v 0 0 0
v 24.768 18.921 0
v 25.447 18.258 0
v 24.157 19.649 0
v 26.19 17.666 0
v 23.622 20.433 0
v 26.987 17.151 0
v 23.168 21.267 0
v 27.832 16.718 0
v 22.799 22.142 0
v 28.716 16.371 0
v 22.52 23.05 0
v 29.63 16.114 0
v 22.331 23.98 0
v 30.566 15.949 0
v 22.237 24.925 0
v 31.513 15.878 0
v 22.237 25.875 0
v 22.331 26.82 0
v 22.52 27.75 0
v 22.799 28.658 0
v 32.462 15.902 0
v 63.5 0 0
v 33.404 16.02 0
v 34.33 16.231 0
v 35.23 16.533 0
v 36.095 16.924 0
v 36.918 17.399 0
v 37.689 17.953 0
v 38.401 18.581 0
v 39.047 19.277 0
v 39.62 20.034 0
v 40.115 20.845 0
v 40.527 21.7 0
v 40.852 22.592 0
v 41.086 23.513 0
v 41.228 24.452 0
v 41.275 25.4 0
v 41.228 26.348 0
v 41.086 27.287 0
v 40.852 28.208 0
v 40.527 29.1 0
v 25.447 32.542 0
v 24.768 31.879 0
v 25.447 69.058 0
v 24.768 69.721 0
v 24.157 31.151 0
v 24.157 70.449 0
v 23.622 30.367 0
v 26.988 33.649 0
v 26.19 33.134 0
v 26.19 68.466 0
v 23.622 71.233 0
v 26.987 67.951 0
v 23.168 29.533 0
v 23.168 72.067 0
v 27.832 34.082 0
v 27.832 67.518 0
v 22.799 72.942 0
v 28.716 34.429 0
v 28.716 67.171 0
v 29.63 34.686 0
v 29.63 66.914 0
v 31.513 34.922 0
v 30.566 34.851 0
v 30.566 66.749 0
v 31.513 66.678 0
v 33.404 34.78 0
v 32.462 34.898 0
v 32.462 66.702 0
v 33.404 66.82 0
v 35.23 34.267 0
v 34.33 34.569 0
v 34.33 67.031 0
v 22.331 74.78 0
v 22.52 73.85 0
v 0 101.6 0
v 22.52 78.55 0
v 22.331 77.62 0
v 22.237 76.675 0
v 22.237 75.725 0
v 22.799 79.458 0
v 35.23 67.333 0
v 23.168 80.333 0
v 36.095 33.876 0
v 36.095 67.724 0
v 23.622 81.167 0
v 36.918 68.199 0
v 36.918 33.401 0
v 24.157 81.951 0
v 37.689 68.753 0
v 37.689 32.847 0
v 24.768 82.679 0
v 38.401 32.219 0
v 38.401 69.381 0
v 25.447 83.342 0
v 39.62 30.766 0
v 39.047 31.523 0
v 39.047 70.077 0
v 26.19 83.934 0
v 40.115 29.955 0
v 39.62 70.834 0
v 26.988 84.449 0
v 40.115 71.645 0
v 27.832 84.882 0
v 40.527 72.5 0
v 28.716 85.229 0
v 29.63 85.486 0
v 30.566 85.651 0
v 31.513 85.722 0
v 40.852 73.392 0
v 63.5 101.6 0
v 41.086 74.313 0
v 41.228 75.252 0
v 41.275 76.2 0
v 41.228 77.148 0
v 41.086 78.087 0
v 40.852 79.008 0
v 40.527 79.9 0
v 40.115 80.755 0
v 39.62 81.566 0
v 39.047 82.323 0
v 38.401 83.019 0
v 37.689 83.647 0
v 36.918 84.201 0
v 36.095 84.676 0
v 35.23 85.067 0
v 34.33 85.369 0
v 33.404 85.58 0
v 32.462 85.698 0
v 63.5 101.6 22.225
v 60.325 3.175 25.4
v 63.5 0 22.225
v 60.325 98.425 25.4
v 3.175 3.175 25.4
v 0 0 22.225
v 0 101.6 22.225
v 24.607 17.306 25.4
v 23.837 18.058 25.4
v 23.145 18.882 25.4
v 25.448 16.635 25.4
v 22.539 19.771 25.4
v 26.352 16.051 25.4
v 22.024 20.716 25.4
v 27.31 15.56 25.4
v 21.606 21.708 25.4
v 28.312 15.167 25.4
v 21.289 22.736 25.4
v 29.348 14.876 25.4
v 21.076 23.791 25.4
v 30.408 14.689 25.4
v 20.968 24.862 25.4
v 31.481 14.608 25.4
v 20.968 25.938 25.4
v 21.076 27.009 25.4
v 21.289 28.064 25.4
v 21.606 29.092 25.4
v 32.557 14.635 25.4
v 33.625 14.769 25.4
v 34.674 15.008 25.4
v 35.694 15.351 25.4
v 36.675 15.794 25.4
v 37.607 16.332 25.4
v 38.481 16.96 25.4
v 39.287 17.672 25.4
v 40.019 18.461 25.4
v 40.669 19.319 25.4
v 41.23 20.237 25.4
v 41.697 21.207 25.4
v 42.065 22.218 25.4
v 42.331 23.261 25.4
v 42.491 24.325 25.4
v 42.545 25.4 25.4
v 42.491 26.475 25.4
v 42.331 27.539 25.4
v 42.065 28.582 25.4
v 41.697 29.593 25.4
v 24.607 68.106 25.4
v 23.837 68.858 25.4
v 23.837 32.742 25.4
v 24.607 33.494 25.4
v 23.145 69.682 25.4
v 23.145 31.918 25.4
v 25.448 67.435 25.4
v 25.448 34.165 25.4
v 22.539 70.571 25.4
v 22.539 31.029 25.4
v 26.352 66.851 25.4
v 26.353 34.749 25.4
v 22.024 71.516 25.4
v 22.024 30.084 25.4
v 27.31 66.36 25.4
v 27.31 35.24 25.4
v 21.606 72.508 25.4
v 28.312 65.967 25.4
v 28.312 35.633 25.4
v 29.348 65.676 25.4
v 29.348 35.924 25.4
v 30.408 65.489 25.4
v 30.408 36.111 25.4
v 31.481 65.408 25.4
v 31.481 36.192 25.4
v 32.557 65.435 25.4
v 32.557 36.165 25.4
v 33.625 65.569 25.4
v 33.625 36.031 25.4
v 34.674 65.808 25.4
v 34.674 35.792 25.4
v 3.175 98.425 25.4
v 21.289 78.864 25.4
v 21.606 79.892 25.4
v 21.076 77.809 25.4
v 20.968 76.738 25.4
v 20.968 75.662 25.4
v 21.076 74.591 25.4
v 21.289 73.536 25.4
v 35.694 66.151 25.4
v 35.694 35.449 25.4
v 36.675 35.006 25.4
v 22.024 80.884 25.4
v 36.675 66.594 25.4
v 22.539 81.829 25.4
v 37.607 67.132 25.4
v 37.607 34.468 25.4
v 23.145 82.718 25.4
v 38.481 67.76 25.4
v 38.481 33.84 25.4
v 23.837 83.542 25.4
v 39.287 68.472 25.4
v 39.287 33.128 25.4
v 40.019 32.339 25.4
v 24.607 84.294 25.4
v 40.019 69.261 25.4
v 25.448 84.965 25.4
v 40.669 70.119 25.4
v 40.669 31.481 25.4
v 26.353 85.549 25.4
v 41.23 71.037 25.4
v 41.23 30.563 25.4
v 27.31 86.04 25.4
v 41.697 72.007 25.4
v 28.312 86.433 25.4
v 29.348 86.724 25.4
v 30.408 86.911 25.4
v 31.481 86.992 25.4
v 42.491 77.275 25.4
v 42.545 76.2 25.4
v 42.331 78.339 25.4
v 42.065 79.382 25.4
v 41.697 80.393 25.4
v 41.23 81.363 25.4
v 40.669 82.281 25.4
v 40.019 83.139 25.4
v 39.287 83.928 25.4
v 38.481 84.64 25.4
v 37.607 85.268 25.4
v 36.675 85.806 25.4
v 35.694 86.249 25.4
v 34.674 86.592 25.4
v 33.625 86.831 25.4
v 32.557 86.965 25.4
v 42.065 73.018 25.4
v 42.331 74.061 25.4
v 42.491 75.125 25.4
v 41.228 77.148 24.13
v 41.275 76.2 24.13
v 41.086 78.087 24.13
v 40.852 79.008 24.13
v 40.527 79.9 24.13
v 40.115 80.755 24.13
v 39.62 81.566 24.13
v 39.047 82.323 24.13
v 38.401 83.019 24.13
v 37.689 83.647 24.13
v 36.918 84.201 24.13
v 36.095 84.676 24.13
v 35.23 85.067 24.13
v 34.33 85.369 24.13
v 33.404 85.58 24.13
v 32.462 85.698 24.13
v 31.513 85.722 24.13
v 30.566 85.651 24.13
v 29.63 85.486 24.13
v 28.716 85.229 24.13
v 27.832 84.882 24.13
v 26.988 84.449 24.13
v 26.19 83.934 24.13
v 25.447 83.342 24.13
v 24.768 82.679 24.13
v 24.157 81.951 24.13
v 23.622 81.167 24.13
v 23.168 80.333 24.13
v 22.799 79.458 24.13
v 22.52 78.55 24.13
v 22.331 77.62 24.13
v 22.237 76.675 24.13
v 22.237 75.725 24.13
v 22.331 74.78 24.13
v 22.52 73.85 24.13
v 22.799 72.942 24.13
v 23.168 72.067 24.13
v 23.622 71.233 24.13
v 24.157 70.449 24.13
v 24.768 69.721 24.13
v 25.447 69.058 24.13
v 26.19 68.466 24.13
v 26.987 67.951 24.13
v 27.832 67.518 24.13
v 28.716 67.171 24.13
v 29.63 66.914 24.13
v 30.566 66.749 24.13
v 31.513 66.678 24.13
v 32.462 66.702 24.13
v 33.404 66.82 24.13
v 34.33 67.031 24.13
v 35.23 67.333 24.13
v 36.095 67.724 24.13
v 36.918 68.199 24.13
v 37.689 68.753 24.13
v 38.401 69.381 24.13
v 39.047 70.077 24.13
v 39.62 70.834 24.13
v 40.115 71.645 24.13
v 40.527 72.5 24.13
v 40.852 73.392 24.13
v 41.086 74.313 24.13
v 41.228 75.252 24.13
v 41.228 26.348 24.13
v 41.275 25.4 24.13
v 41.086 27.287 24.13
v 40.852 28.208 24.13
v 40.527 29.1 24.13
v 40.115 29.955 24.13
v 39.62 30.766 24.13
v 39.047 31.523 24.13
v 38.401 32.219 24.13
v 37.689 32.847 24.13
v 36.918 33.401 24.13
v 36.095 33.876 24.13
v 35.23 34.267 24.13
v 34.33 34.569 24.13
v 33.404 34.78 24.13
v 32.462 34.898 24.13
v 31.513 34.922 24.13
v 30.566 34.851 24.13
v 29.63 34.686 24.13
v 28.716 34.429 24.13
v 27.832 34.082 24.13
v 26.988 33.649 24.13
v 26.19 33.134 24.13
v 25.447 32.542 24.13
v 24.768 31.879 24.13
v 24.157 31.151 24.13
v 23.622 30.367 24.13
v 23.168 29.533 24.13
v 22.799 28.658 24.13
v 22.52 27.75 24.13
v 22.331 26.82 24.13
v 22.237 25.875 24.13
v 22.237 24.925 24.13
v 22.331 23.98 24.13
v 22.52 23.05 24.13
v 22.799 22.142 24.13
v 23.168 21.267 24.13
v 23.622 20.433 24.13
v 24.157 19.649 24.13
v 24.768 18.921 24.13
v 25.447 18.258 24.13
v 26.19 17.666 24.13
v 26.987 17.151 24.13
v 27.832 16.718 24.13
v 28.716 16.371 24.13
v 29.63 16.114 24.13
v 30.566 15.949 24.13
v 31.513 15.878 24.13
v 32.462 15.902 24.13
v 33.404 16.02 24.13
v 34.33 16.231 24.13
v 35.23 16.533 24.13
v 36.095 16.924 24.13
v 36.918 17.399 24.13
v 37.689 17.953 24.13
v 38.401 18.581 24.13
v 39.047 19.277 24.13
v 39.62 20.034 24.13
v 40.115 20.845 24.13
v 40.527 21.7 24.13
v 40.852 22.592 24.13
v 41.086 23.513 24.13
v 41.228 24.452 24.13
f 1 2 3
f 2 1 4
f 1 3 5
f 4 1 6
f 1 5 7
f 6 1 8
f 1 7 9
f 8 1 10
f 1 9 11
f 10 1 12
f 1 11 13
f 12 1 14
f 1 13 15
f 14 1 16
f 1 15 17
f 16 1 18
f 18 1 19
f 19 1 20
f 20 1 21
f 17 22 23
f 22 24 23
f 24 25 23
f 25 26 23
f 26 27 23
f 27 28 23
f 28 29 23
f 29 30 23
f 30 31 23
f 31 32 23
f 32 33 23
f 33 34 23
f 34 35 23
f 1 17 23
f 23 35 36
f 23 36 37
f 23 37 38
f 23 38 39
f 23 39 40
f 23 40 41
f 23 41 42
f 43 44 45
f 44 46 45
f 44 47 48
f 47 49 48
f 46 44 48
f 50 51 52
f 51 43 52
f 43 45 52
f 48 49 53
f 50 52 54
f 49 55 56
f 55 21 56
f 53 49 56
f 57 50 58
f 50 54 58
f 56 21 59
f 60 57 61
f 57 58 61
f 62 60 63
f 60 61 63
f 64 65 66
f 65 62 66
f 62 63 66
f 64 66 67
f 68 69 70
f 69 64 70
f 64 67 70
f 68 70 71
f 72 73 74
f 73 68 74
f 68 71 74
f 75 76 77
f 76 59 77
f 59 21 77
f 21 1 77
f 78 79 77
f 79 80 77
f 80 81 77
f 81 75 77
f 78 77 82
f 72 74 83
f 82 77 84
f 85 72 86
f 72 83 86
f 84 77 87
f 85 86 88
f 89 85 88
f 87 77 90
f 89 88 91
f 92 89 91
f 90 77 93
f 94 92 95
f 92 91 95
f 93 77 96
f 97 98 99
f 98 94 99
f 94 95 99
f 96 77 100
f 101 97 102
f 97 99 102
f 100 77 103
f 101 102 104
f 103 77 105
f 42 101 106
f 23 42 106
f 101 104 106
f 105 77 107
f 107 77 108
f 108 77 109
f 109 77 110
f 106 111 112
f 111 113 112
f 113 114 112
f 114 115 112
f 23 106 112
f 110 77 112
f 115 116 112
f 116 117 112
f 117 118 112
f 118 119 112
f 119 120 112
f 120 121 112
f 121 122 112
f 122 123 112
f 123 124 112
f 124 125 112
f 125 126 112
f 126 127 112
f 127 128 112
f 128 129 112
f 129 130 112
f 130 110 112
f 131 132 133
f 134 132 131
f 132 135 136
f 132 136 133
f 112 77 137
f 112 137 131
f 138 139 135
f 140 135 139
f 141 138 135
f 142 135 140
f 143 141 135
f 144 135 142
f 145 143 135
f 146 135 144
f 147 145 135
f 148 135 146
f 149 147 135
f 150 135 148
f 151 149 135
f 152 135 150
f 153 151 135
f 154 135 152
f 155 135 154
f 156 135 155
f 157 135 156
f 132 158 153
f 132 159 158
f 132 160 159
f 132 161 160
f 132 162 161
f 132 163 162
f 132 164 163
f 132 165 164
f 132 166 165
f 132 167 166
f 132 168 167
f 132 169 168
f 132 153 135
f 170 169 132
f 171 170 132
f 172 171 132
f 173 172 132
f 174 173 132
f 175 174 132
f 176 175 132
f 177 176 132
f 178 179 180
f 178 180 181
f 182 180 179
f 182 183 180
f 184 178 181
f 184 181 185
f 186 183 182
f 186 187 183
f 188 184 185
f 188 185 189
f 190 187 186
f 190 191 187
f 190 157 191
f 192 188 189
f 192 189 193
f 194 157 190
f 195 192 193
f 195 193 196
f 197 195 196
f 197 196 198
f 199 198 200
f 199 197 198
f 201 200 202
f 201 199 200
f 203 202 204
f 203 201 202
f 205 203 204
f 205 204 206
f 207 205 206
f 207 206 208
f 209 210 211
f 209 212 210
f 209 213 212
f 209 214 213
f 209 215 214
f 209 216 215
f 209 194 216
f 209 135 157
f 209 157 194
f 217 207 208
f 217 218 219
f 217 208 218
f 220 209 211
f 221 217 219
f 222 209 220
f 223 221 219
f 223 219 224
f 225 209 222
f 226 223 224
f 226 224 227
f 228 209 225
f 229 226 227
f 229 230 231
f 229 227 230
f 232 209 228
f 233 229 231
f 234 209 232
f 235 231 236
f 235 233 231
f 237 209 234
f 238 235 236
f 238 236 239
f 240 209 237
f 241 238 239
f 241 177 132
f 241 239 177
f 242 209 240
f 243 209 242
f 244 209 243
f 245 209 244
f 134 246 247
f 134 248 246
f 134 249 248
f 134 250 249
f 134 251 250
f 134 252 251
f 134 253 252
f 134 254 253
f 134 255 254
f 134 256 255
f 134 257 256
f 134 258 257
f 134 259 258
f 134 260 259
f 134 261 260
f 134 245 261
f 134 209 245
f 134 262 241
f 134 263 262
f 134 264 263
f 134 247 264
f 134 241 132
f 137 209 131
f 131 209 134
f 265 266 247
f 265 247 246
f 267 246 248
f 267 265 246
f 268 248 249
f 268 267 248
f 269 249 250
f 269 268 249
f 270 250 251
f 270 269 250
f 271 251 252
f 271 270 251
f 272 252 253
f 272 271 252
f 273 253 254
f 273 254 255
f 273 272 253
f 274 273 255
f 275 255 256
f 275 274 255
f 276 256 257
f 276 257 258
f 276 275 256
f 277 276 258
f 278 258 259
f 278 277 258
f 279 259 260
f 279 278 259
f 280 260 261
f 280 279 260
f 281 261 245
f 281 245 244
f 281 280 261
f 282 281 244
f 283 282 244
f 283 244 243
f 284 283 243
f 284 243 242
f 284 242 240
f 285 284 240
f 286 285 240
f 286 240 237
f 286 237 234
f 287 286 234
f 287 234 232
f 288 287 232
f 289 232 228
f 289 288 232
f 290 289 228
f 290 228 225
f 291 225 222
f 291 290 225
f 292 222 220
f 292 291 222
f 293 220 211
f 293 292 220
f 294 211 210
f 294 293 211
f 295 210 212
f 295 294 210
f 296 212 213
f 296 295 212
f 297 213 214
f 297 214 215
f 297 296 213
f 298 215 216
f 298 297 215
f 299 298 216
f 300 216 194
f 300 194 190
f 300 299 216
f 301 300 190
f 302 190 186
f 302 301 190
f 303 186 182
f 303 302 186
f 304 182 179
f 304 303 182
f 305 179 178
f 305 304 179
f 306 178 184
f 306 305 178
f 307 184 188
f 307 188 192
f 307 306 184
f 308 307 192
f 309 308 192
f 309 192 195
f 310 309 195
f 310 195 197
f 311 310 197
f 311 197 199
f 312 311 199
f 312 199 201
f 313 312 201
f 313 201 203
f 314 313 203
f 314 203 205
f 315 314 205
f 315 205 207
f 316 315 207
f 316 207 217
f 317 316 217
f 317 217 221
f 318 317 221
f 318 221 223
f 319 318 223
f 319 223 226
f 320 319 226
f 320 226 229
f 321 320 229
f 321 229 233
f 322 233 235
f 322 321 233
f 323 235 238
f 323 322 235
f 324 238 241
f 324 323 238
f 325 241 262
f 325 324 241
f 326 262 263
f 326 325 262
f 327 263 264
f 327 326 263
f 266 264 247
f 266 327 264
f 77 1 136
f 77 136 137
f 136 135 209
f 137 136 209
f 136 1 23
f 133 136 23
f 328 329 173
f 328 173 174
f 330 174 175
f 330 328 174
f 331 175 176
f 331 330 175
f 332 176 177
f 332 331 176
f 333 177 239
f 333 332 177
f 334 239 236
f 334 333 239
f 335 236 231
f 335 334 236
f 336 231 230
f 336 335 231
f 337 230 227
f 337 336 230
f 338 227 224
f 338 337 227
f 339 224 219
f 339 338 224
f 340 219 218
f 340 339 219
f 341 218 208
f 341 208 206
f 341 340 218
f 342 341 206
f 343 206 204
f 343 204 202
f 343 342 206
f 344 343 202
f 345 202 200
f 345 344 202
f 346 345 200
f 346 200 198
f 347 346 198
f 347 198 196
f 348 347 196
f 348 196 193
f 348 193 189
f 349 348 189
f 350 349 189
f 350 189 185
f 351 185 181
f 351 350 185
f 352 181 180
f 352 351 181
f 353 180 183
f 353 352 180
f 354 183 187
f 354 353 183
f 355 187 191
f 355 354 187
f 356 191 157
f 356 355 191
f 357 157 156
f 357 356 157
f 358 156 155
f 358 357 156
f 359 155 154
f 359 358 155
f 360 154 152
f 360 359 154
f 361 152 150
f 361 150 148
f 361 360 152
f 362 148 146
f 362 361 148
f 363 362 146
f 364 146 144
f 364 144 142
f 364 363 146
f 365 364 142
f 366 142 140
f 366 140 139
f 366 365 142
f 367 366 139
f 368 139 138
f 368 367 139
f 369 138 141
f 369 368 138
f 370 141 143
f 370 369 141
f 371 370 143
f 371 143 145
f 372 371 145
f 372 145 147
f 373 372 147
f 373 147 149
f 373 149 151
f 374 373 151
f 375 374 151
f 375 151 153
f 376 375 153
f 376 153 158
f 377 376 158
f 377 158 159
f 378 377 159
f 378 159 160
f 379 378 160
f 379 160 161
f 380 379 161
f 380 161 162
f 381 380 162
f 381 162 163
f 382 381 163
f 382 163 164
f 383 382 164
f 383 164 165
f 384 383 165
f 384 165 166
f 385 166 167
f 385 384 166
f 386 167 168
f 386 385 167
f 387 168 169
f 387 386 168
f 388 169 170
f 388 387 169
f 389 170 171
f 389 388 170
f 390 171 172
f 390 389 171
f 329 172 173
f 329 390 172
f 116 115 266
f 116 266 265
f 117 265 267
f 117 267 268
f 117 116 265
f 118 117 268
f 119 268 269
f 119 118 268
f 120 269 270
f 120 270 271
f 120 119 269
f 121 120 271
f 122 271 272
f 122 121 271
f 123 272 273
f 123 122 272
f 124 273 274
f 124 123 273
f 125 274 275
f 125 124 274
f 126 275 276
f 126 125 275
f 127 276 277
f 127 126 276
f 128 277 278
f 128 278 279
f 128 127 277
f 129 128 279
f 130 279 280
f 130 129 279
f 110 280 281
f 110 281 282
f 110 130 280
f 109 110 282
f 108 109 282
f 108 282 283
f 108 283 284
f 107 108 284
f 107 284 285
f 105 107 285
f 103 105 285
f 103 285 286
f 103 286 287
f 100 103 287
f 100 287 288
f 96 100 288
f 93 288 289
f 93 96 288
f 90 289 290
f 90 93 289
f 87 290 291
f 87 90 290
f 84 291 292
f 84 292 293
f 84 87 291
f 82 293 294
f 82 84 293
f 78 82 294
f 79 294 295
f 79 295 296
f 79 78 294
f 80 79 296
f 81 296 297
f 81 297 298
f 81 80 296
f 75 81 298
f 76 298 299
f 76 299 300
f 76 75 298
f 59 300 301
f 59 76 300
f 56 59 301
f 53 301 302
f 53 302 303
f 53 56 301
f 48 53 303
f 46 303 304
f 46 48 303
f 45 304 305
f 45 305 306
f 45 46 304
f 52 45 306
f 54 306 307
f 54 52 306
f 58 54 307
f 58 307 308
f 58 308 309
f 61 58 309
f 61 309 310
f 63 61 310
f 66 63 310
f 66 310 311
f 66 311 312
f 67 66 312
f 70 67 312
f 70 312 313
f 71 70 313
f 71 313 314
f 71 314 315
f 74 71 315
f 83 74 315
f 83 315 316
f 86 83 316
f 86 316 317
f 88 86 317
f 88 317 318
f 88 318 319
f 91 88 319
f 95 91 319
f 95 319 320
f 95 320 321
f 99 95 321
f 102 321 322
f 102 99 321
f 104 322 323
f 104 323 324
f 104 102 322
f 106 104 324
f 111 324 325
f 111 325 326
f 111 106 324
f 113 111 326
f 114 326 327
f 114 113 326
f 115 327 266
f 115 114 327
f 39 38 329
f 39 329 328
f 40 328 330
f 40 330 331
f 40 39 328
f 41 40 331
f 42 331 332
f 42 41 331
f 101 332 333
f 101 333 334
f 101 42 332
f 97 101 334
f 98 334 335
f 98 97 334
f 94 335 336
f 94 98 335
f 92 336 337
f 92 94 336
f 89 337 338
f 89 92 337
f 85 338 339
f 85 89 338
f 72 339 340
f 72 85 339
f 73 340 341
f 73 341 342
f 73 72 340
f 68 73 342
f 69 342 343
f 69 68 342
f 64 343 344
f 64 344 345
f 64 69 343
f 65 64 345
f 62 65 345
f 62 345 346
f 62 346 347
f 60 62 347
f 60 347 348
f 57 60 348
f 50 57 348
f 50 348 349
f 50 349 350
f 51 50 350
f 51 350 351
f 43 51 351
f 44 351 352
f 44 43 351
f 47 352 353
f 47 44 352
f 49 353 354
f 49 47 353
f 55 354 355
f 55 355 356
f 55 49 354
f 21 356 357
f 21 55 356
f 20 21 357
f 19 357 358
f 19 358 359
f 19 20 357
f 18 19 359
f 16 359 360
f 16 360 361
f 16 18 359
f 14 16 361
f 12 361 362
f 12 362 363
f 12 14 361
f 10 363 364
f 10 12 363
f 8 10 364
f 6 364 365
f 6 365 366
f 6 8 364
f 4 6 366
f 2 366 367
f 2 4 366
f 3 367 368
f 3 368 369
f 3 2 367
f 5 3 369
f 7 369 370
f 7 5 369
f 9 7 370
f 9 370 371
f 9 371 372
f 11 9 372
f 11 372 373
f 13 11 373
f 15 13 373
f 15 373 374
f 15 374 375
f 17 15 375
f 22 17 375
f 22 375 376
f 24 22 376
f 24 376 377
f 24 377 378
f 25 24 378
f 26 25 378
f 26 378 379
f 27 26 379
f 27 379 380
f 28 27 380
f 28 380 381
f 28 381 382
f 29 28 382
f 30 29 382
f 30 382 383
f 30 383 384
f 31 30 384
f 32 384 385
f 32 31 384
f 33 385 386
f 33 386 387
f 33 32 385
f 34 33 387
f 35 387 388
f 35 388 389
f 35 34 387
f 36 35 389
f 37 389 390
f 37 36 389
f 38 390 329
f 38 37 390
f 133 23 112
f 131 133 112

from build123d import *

# Parameters (mm, degrees)
F0_W     = 63.5
F0_H     = 101.6
F0_R     = 9.525
F1_DEPTH = 25.4
F2_SIZE  = 3.175
F3_SIZE  = 1.27


with BuildPart() as f1:
    # F0 (on Top) → F1 (new body)
    with BuildSketch(Plane.XY):
        with Locations((31.75, 50.8)):
            Rectangle(F0_W, F0_H)
        with Locations((31.75, 25.4)):
            Circle(F0_R, mode=Mode.SUBTRACT)
        with Locations((31.75, 76.2)):
            Circle(F0_R, mode=Mode.SUBTRACT)
    extrude(amount=F1_DEPTH)

    # F2
    f2_edges = [f1.edges().sort_by_distance(p)[0] for p in [
        (63.5, 50.8, 25.4),
        (31.75, 101.6, 25.4),
        (0, 50.8, 25.4),
        (31.75, 0, 25.4),
    ]]
    chamfer(f2_edges, length=F2_SIZE)

    # F3
    f3_edges = [f1.edges().sort_by_distance(p)[0] for p in [
        (22.225, 76.2, 25.4),
        (22.225, 25.4, 25.4),
    ]]
    chamfer(f3_edges, length=F3_SIZE)


solid = f1.part
